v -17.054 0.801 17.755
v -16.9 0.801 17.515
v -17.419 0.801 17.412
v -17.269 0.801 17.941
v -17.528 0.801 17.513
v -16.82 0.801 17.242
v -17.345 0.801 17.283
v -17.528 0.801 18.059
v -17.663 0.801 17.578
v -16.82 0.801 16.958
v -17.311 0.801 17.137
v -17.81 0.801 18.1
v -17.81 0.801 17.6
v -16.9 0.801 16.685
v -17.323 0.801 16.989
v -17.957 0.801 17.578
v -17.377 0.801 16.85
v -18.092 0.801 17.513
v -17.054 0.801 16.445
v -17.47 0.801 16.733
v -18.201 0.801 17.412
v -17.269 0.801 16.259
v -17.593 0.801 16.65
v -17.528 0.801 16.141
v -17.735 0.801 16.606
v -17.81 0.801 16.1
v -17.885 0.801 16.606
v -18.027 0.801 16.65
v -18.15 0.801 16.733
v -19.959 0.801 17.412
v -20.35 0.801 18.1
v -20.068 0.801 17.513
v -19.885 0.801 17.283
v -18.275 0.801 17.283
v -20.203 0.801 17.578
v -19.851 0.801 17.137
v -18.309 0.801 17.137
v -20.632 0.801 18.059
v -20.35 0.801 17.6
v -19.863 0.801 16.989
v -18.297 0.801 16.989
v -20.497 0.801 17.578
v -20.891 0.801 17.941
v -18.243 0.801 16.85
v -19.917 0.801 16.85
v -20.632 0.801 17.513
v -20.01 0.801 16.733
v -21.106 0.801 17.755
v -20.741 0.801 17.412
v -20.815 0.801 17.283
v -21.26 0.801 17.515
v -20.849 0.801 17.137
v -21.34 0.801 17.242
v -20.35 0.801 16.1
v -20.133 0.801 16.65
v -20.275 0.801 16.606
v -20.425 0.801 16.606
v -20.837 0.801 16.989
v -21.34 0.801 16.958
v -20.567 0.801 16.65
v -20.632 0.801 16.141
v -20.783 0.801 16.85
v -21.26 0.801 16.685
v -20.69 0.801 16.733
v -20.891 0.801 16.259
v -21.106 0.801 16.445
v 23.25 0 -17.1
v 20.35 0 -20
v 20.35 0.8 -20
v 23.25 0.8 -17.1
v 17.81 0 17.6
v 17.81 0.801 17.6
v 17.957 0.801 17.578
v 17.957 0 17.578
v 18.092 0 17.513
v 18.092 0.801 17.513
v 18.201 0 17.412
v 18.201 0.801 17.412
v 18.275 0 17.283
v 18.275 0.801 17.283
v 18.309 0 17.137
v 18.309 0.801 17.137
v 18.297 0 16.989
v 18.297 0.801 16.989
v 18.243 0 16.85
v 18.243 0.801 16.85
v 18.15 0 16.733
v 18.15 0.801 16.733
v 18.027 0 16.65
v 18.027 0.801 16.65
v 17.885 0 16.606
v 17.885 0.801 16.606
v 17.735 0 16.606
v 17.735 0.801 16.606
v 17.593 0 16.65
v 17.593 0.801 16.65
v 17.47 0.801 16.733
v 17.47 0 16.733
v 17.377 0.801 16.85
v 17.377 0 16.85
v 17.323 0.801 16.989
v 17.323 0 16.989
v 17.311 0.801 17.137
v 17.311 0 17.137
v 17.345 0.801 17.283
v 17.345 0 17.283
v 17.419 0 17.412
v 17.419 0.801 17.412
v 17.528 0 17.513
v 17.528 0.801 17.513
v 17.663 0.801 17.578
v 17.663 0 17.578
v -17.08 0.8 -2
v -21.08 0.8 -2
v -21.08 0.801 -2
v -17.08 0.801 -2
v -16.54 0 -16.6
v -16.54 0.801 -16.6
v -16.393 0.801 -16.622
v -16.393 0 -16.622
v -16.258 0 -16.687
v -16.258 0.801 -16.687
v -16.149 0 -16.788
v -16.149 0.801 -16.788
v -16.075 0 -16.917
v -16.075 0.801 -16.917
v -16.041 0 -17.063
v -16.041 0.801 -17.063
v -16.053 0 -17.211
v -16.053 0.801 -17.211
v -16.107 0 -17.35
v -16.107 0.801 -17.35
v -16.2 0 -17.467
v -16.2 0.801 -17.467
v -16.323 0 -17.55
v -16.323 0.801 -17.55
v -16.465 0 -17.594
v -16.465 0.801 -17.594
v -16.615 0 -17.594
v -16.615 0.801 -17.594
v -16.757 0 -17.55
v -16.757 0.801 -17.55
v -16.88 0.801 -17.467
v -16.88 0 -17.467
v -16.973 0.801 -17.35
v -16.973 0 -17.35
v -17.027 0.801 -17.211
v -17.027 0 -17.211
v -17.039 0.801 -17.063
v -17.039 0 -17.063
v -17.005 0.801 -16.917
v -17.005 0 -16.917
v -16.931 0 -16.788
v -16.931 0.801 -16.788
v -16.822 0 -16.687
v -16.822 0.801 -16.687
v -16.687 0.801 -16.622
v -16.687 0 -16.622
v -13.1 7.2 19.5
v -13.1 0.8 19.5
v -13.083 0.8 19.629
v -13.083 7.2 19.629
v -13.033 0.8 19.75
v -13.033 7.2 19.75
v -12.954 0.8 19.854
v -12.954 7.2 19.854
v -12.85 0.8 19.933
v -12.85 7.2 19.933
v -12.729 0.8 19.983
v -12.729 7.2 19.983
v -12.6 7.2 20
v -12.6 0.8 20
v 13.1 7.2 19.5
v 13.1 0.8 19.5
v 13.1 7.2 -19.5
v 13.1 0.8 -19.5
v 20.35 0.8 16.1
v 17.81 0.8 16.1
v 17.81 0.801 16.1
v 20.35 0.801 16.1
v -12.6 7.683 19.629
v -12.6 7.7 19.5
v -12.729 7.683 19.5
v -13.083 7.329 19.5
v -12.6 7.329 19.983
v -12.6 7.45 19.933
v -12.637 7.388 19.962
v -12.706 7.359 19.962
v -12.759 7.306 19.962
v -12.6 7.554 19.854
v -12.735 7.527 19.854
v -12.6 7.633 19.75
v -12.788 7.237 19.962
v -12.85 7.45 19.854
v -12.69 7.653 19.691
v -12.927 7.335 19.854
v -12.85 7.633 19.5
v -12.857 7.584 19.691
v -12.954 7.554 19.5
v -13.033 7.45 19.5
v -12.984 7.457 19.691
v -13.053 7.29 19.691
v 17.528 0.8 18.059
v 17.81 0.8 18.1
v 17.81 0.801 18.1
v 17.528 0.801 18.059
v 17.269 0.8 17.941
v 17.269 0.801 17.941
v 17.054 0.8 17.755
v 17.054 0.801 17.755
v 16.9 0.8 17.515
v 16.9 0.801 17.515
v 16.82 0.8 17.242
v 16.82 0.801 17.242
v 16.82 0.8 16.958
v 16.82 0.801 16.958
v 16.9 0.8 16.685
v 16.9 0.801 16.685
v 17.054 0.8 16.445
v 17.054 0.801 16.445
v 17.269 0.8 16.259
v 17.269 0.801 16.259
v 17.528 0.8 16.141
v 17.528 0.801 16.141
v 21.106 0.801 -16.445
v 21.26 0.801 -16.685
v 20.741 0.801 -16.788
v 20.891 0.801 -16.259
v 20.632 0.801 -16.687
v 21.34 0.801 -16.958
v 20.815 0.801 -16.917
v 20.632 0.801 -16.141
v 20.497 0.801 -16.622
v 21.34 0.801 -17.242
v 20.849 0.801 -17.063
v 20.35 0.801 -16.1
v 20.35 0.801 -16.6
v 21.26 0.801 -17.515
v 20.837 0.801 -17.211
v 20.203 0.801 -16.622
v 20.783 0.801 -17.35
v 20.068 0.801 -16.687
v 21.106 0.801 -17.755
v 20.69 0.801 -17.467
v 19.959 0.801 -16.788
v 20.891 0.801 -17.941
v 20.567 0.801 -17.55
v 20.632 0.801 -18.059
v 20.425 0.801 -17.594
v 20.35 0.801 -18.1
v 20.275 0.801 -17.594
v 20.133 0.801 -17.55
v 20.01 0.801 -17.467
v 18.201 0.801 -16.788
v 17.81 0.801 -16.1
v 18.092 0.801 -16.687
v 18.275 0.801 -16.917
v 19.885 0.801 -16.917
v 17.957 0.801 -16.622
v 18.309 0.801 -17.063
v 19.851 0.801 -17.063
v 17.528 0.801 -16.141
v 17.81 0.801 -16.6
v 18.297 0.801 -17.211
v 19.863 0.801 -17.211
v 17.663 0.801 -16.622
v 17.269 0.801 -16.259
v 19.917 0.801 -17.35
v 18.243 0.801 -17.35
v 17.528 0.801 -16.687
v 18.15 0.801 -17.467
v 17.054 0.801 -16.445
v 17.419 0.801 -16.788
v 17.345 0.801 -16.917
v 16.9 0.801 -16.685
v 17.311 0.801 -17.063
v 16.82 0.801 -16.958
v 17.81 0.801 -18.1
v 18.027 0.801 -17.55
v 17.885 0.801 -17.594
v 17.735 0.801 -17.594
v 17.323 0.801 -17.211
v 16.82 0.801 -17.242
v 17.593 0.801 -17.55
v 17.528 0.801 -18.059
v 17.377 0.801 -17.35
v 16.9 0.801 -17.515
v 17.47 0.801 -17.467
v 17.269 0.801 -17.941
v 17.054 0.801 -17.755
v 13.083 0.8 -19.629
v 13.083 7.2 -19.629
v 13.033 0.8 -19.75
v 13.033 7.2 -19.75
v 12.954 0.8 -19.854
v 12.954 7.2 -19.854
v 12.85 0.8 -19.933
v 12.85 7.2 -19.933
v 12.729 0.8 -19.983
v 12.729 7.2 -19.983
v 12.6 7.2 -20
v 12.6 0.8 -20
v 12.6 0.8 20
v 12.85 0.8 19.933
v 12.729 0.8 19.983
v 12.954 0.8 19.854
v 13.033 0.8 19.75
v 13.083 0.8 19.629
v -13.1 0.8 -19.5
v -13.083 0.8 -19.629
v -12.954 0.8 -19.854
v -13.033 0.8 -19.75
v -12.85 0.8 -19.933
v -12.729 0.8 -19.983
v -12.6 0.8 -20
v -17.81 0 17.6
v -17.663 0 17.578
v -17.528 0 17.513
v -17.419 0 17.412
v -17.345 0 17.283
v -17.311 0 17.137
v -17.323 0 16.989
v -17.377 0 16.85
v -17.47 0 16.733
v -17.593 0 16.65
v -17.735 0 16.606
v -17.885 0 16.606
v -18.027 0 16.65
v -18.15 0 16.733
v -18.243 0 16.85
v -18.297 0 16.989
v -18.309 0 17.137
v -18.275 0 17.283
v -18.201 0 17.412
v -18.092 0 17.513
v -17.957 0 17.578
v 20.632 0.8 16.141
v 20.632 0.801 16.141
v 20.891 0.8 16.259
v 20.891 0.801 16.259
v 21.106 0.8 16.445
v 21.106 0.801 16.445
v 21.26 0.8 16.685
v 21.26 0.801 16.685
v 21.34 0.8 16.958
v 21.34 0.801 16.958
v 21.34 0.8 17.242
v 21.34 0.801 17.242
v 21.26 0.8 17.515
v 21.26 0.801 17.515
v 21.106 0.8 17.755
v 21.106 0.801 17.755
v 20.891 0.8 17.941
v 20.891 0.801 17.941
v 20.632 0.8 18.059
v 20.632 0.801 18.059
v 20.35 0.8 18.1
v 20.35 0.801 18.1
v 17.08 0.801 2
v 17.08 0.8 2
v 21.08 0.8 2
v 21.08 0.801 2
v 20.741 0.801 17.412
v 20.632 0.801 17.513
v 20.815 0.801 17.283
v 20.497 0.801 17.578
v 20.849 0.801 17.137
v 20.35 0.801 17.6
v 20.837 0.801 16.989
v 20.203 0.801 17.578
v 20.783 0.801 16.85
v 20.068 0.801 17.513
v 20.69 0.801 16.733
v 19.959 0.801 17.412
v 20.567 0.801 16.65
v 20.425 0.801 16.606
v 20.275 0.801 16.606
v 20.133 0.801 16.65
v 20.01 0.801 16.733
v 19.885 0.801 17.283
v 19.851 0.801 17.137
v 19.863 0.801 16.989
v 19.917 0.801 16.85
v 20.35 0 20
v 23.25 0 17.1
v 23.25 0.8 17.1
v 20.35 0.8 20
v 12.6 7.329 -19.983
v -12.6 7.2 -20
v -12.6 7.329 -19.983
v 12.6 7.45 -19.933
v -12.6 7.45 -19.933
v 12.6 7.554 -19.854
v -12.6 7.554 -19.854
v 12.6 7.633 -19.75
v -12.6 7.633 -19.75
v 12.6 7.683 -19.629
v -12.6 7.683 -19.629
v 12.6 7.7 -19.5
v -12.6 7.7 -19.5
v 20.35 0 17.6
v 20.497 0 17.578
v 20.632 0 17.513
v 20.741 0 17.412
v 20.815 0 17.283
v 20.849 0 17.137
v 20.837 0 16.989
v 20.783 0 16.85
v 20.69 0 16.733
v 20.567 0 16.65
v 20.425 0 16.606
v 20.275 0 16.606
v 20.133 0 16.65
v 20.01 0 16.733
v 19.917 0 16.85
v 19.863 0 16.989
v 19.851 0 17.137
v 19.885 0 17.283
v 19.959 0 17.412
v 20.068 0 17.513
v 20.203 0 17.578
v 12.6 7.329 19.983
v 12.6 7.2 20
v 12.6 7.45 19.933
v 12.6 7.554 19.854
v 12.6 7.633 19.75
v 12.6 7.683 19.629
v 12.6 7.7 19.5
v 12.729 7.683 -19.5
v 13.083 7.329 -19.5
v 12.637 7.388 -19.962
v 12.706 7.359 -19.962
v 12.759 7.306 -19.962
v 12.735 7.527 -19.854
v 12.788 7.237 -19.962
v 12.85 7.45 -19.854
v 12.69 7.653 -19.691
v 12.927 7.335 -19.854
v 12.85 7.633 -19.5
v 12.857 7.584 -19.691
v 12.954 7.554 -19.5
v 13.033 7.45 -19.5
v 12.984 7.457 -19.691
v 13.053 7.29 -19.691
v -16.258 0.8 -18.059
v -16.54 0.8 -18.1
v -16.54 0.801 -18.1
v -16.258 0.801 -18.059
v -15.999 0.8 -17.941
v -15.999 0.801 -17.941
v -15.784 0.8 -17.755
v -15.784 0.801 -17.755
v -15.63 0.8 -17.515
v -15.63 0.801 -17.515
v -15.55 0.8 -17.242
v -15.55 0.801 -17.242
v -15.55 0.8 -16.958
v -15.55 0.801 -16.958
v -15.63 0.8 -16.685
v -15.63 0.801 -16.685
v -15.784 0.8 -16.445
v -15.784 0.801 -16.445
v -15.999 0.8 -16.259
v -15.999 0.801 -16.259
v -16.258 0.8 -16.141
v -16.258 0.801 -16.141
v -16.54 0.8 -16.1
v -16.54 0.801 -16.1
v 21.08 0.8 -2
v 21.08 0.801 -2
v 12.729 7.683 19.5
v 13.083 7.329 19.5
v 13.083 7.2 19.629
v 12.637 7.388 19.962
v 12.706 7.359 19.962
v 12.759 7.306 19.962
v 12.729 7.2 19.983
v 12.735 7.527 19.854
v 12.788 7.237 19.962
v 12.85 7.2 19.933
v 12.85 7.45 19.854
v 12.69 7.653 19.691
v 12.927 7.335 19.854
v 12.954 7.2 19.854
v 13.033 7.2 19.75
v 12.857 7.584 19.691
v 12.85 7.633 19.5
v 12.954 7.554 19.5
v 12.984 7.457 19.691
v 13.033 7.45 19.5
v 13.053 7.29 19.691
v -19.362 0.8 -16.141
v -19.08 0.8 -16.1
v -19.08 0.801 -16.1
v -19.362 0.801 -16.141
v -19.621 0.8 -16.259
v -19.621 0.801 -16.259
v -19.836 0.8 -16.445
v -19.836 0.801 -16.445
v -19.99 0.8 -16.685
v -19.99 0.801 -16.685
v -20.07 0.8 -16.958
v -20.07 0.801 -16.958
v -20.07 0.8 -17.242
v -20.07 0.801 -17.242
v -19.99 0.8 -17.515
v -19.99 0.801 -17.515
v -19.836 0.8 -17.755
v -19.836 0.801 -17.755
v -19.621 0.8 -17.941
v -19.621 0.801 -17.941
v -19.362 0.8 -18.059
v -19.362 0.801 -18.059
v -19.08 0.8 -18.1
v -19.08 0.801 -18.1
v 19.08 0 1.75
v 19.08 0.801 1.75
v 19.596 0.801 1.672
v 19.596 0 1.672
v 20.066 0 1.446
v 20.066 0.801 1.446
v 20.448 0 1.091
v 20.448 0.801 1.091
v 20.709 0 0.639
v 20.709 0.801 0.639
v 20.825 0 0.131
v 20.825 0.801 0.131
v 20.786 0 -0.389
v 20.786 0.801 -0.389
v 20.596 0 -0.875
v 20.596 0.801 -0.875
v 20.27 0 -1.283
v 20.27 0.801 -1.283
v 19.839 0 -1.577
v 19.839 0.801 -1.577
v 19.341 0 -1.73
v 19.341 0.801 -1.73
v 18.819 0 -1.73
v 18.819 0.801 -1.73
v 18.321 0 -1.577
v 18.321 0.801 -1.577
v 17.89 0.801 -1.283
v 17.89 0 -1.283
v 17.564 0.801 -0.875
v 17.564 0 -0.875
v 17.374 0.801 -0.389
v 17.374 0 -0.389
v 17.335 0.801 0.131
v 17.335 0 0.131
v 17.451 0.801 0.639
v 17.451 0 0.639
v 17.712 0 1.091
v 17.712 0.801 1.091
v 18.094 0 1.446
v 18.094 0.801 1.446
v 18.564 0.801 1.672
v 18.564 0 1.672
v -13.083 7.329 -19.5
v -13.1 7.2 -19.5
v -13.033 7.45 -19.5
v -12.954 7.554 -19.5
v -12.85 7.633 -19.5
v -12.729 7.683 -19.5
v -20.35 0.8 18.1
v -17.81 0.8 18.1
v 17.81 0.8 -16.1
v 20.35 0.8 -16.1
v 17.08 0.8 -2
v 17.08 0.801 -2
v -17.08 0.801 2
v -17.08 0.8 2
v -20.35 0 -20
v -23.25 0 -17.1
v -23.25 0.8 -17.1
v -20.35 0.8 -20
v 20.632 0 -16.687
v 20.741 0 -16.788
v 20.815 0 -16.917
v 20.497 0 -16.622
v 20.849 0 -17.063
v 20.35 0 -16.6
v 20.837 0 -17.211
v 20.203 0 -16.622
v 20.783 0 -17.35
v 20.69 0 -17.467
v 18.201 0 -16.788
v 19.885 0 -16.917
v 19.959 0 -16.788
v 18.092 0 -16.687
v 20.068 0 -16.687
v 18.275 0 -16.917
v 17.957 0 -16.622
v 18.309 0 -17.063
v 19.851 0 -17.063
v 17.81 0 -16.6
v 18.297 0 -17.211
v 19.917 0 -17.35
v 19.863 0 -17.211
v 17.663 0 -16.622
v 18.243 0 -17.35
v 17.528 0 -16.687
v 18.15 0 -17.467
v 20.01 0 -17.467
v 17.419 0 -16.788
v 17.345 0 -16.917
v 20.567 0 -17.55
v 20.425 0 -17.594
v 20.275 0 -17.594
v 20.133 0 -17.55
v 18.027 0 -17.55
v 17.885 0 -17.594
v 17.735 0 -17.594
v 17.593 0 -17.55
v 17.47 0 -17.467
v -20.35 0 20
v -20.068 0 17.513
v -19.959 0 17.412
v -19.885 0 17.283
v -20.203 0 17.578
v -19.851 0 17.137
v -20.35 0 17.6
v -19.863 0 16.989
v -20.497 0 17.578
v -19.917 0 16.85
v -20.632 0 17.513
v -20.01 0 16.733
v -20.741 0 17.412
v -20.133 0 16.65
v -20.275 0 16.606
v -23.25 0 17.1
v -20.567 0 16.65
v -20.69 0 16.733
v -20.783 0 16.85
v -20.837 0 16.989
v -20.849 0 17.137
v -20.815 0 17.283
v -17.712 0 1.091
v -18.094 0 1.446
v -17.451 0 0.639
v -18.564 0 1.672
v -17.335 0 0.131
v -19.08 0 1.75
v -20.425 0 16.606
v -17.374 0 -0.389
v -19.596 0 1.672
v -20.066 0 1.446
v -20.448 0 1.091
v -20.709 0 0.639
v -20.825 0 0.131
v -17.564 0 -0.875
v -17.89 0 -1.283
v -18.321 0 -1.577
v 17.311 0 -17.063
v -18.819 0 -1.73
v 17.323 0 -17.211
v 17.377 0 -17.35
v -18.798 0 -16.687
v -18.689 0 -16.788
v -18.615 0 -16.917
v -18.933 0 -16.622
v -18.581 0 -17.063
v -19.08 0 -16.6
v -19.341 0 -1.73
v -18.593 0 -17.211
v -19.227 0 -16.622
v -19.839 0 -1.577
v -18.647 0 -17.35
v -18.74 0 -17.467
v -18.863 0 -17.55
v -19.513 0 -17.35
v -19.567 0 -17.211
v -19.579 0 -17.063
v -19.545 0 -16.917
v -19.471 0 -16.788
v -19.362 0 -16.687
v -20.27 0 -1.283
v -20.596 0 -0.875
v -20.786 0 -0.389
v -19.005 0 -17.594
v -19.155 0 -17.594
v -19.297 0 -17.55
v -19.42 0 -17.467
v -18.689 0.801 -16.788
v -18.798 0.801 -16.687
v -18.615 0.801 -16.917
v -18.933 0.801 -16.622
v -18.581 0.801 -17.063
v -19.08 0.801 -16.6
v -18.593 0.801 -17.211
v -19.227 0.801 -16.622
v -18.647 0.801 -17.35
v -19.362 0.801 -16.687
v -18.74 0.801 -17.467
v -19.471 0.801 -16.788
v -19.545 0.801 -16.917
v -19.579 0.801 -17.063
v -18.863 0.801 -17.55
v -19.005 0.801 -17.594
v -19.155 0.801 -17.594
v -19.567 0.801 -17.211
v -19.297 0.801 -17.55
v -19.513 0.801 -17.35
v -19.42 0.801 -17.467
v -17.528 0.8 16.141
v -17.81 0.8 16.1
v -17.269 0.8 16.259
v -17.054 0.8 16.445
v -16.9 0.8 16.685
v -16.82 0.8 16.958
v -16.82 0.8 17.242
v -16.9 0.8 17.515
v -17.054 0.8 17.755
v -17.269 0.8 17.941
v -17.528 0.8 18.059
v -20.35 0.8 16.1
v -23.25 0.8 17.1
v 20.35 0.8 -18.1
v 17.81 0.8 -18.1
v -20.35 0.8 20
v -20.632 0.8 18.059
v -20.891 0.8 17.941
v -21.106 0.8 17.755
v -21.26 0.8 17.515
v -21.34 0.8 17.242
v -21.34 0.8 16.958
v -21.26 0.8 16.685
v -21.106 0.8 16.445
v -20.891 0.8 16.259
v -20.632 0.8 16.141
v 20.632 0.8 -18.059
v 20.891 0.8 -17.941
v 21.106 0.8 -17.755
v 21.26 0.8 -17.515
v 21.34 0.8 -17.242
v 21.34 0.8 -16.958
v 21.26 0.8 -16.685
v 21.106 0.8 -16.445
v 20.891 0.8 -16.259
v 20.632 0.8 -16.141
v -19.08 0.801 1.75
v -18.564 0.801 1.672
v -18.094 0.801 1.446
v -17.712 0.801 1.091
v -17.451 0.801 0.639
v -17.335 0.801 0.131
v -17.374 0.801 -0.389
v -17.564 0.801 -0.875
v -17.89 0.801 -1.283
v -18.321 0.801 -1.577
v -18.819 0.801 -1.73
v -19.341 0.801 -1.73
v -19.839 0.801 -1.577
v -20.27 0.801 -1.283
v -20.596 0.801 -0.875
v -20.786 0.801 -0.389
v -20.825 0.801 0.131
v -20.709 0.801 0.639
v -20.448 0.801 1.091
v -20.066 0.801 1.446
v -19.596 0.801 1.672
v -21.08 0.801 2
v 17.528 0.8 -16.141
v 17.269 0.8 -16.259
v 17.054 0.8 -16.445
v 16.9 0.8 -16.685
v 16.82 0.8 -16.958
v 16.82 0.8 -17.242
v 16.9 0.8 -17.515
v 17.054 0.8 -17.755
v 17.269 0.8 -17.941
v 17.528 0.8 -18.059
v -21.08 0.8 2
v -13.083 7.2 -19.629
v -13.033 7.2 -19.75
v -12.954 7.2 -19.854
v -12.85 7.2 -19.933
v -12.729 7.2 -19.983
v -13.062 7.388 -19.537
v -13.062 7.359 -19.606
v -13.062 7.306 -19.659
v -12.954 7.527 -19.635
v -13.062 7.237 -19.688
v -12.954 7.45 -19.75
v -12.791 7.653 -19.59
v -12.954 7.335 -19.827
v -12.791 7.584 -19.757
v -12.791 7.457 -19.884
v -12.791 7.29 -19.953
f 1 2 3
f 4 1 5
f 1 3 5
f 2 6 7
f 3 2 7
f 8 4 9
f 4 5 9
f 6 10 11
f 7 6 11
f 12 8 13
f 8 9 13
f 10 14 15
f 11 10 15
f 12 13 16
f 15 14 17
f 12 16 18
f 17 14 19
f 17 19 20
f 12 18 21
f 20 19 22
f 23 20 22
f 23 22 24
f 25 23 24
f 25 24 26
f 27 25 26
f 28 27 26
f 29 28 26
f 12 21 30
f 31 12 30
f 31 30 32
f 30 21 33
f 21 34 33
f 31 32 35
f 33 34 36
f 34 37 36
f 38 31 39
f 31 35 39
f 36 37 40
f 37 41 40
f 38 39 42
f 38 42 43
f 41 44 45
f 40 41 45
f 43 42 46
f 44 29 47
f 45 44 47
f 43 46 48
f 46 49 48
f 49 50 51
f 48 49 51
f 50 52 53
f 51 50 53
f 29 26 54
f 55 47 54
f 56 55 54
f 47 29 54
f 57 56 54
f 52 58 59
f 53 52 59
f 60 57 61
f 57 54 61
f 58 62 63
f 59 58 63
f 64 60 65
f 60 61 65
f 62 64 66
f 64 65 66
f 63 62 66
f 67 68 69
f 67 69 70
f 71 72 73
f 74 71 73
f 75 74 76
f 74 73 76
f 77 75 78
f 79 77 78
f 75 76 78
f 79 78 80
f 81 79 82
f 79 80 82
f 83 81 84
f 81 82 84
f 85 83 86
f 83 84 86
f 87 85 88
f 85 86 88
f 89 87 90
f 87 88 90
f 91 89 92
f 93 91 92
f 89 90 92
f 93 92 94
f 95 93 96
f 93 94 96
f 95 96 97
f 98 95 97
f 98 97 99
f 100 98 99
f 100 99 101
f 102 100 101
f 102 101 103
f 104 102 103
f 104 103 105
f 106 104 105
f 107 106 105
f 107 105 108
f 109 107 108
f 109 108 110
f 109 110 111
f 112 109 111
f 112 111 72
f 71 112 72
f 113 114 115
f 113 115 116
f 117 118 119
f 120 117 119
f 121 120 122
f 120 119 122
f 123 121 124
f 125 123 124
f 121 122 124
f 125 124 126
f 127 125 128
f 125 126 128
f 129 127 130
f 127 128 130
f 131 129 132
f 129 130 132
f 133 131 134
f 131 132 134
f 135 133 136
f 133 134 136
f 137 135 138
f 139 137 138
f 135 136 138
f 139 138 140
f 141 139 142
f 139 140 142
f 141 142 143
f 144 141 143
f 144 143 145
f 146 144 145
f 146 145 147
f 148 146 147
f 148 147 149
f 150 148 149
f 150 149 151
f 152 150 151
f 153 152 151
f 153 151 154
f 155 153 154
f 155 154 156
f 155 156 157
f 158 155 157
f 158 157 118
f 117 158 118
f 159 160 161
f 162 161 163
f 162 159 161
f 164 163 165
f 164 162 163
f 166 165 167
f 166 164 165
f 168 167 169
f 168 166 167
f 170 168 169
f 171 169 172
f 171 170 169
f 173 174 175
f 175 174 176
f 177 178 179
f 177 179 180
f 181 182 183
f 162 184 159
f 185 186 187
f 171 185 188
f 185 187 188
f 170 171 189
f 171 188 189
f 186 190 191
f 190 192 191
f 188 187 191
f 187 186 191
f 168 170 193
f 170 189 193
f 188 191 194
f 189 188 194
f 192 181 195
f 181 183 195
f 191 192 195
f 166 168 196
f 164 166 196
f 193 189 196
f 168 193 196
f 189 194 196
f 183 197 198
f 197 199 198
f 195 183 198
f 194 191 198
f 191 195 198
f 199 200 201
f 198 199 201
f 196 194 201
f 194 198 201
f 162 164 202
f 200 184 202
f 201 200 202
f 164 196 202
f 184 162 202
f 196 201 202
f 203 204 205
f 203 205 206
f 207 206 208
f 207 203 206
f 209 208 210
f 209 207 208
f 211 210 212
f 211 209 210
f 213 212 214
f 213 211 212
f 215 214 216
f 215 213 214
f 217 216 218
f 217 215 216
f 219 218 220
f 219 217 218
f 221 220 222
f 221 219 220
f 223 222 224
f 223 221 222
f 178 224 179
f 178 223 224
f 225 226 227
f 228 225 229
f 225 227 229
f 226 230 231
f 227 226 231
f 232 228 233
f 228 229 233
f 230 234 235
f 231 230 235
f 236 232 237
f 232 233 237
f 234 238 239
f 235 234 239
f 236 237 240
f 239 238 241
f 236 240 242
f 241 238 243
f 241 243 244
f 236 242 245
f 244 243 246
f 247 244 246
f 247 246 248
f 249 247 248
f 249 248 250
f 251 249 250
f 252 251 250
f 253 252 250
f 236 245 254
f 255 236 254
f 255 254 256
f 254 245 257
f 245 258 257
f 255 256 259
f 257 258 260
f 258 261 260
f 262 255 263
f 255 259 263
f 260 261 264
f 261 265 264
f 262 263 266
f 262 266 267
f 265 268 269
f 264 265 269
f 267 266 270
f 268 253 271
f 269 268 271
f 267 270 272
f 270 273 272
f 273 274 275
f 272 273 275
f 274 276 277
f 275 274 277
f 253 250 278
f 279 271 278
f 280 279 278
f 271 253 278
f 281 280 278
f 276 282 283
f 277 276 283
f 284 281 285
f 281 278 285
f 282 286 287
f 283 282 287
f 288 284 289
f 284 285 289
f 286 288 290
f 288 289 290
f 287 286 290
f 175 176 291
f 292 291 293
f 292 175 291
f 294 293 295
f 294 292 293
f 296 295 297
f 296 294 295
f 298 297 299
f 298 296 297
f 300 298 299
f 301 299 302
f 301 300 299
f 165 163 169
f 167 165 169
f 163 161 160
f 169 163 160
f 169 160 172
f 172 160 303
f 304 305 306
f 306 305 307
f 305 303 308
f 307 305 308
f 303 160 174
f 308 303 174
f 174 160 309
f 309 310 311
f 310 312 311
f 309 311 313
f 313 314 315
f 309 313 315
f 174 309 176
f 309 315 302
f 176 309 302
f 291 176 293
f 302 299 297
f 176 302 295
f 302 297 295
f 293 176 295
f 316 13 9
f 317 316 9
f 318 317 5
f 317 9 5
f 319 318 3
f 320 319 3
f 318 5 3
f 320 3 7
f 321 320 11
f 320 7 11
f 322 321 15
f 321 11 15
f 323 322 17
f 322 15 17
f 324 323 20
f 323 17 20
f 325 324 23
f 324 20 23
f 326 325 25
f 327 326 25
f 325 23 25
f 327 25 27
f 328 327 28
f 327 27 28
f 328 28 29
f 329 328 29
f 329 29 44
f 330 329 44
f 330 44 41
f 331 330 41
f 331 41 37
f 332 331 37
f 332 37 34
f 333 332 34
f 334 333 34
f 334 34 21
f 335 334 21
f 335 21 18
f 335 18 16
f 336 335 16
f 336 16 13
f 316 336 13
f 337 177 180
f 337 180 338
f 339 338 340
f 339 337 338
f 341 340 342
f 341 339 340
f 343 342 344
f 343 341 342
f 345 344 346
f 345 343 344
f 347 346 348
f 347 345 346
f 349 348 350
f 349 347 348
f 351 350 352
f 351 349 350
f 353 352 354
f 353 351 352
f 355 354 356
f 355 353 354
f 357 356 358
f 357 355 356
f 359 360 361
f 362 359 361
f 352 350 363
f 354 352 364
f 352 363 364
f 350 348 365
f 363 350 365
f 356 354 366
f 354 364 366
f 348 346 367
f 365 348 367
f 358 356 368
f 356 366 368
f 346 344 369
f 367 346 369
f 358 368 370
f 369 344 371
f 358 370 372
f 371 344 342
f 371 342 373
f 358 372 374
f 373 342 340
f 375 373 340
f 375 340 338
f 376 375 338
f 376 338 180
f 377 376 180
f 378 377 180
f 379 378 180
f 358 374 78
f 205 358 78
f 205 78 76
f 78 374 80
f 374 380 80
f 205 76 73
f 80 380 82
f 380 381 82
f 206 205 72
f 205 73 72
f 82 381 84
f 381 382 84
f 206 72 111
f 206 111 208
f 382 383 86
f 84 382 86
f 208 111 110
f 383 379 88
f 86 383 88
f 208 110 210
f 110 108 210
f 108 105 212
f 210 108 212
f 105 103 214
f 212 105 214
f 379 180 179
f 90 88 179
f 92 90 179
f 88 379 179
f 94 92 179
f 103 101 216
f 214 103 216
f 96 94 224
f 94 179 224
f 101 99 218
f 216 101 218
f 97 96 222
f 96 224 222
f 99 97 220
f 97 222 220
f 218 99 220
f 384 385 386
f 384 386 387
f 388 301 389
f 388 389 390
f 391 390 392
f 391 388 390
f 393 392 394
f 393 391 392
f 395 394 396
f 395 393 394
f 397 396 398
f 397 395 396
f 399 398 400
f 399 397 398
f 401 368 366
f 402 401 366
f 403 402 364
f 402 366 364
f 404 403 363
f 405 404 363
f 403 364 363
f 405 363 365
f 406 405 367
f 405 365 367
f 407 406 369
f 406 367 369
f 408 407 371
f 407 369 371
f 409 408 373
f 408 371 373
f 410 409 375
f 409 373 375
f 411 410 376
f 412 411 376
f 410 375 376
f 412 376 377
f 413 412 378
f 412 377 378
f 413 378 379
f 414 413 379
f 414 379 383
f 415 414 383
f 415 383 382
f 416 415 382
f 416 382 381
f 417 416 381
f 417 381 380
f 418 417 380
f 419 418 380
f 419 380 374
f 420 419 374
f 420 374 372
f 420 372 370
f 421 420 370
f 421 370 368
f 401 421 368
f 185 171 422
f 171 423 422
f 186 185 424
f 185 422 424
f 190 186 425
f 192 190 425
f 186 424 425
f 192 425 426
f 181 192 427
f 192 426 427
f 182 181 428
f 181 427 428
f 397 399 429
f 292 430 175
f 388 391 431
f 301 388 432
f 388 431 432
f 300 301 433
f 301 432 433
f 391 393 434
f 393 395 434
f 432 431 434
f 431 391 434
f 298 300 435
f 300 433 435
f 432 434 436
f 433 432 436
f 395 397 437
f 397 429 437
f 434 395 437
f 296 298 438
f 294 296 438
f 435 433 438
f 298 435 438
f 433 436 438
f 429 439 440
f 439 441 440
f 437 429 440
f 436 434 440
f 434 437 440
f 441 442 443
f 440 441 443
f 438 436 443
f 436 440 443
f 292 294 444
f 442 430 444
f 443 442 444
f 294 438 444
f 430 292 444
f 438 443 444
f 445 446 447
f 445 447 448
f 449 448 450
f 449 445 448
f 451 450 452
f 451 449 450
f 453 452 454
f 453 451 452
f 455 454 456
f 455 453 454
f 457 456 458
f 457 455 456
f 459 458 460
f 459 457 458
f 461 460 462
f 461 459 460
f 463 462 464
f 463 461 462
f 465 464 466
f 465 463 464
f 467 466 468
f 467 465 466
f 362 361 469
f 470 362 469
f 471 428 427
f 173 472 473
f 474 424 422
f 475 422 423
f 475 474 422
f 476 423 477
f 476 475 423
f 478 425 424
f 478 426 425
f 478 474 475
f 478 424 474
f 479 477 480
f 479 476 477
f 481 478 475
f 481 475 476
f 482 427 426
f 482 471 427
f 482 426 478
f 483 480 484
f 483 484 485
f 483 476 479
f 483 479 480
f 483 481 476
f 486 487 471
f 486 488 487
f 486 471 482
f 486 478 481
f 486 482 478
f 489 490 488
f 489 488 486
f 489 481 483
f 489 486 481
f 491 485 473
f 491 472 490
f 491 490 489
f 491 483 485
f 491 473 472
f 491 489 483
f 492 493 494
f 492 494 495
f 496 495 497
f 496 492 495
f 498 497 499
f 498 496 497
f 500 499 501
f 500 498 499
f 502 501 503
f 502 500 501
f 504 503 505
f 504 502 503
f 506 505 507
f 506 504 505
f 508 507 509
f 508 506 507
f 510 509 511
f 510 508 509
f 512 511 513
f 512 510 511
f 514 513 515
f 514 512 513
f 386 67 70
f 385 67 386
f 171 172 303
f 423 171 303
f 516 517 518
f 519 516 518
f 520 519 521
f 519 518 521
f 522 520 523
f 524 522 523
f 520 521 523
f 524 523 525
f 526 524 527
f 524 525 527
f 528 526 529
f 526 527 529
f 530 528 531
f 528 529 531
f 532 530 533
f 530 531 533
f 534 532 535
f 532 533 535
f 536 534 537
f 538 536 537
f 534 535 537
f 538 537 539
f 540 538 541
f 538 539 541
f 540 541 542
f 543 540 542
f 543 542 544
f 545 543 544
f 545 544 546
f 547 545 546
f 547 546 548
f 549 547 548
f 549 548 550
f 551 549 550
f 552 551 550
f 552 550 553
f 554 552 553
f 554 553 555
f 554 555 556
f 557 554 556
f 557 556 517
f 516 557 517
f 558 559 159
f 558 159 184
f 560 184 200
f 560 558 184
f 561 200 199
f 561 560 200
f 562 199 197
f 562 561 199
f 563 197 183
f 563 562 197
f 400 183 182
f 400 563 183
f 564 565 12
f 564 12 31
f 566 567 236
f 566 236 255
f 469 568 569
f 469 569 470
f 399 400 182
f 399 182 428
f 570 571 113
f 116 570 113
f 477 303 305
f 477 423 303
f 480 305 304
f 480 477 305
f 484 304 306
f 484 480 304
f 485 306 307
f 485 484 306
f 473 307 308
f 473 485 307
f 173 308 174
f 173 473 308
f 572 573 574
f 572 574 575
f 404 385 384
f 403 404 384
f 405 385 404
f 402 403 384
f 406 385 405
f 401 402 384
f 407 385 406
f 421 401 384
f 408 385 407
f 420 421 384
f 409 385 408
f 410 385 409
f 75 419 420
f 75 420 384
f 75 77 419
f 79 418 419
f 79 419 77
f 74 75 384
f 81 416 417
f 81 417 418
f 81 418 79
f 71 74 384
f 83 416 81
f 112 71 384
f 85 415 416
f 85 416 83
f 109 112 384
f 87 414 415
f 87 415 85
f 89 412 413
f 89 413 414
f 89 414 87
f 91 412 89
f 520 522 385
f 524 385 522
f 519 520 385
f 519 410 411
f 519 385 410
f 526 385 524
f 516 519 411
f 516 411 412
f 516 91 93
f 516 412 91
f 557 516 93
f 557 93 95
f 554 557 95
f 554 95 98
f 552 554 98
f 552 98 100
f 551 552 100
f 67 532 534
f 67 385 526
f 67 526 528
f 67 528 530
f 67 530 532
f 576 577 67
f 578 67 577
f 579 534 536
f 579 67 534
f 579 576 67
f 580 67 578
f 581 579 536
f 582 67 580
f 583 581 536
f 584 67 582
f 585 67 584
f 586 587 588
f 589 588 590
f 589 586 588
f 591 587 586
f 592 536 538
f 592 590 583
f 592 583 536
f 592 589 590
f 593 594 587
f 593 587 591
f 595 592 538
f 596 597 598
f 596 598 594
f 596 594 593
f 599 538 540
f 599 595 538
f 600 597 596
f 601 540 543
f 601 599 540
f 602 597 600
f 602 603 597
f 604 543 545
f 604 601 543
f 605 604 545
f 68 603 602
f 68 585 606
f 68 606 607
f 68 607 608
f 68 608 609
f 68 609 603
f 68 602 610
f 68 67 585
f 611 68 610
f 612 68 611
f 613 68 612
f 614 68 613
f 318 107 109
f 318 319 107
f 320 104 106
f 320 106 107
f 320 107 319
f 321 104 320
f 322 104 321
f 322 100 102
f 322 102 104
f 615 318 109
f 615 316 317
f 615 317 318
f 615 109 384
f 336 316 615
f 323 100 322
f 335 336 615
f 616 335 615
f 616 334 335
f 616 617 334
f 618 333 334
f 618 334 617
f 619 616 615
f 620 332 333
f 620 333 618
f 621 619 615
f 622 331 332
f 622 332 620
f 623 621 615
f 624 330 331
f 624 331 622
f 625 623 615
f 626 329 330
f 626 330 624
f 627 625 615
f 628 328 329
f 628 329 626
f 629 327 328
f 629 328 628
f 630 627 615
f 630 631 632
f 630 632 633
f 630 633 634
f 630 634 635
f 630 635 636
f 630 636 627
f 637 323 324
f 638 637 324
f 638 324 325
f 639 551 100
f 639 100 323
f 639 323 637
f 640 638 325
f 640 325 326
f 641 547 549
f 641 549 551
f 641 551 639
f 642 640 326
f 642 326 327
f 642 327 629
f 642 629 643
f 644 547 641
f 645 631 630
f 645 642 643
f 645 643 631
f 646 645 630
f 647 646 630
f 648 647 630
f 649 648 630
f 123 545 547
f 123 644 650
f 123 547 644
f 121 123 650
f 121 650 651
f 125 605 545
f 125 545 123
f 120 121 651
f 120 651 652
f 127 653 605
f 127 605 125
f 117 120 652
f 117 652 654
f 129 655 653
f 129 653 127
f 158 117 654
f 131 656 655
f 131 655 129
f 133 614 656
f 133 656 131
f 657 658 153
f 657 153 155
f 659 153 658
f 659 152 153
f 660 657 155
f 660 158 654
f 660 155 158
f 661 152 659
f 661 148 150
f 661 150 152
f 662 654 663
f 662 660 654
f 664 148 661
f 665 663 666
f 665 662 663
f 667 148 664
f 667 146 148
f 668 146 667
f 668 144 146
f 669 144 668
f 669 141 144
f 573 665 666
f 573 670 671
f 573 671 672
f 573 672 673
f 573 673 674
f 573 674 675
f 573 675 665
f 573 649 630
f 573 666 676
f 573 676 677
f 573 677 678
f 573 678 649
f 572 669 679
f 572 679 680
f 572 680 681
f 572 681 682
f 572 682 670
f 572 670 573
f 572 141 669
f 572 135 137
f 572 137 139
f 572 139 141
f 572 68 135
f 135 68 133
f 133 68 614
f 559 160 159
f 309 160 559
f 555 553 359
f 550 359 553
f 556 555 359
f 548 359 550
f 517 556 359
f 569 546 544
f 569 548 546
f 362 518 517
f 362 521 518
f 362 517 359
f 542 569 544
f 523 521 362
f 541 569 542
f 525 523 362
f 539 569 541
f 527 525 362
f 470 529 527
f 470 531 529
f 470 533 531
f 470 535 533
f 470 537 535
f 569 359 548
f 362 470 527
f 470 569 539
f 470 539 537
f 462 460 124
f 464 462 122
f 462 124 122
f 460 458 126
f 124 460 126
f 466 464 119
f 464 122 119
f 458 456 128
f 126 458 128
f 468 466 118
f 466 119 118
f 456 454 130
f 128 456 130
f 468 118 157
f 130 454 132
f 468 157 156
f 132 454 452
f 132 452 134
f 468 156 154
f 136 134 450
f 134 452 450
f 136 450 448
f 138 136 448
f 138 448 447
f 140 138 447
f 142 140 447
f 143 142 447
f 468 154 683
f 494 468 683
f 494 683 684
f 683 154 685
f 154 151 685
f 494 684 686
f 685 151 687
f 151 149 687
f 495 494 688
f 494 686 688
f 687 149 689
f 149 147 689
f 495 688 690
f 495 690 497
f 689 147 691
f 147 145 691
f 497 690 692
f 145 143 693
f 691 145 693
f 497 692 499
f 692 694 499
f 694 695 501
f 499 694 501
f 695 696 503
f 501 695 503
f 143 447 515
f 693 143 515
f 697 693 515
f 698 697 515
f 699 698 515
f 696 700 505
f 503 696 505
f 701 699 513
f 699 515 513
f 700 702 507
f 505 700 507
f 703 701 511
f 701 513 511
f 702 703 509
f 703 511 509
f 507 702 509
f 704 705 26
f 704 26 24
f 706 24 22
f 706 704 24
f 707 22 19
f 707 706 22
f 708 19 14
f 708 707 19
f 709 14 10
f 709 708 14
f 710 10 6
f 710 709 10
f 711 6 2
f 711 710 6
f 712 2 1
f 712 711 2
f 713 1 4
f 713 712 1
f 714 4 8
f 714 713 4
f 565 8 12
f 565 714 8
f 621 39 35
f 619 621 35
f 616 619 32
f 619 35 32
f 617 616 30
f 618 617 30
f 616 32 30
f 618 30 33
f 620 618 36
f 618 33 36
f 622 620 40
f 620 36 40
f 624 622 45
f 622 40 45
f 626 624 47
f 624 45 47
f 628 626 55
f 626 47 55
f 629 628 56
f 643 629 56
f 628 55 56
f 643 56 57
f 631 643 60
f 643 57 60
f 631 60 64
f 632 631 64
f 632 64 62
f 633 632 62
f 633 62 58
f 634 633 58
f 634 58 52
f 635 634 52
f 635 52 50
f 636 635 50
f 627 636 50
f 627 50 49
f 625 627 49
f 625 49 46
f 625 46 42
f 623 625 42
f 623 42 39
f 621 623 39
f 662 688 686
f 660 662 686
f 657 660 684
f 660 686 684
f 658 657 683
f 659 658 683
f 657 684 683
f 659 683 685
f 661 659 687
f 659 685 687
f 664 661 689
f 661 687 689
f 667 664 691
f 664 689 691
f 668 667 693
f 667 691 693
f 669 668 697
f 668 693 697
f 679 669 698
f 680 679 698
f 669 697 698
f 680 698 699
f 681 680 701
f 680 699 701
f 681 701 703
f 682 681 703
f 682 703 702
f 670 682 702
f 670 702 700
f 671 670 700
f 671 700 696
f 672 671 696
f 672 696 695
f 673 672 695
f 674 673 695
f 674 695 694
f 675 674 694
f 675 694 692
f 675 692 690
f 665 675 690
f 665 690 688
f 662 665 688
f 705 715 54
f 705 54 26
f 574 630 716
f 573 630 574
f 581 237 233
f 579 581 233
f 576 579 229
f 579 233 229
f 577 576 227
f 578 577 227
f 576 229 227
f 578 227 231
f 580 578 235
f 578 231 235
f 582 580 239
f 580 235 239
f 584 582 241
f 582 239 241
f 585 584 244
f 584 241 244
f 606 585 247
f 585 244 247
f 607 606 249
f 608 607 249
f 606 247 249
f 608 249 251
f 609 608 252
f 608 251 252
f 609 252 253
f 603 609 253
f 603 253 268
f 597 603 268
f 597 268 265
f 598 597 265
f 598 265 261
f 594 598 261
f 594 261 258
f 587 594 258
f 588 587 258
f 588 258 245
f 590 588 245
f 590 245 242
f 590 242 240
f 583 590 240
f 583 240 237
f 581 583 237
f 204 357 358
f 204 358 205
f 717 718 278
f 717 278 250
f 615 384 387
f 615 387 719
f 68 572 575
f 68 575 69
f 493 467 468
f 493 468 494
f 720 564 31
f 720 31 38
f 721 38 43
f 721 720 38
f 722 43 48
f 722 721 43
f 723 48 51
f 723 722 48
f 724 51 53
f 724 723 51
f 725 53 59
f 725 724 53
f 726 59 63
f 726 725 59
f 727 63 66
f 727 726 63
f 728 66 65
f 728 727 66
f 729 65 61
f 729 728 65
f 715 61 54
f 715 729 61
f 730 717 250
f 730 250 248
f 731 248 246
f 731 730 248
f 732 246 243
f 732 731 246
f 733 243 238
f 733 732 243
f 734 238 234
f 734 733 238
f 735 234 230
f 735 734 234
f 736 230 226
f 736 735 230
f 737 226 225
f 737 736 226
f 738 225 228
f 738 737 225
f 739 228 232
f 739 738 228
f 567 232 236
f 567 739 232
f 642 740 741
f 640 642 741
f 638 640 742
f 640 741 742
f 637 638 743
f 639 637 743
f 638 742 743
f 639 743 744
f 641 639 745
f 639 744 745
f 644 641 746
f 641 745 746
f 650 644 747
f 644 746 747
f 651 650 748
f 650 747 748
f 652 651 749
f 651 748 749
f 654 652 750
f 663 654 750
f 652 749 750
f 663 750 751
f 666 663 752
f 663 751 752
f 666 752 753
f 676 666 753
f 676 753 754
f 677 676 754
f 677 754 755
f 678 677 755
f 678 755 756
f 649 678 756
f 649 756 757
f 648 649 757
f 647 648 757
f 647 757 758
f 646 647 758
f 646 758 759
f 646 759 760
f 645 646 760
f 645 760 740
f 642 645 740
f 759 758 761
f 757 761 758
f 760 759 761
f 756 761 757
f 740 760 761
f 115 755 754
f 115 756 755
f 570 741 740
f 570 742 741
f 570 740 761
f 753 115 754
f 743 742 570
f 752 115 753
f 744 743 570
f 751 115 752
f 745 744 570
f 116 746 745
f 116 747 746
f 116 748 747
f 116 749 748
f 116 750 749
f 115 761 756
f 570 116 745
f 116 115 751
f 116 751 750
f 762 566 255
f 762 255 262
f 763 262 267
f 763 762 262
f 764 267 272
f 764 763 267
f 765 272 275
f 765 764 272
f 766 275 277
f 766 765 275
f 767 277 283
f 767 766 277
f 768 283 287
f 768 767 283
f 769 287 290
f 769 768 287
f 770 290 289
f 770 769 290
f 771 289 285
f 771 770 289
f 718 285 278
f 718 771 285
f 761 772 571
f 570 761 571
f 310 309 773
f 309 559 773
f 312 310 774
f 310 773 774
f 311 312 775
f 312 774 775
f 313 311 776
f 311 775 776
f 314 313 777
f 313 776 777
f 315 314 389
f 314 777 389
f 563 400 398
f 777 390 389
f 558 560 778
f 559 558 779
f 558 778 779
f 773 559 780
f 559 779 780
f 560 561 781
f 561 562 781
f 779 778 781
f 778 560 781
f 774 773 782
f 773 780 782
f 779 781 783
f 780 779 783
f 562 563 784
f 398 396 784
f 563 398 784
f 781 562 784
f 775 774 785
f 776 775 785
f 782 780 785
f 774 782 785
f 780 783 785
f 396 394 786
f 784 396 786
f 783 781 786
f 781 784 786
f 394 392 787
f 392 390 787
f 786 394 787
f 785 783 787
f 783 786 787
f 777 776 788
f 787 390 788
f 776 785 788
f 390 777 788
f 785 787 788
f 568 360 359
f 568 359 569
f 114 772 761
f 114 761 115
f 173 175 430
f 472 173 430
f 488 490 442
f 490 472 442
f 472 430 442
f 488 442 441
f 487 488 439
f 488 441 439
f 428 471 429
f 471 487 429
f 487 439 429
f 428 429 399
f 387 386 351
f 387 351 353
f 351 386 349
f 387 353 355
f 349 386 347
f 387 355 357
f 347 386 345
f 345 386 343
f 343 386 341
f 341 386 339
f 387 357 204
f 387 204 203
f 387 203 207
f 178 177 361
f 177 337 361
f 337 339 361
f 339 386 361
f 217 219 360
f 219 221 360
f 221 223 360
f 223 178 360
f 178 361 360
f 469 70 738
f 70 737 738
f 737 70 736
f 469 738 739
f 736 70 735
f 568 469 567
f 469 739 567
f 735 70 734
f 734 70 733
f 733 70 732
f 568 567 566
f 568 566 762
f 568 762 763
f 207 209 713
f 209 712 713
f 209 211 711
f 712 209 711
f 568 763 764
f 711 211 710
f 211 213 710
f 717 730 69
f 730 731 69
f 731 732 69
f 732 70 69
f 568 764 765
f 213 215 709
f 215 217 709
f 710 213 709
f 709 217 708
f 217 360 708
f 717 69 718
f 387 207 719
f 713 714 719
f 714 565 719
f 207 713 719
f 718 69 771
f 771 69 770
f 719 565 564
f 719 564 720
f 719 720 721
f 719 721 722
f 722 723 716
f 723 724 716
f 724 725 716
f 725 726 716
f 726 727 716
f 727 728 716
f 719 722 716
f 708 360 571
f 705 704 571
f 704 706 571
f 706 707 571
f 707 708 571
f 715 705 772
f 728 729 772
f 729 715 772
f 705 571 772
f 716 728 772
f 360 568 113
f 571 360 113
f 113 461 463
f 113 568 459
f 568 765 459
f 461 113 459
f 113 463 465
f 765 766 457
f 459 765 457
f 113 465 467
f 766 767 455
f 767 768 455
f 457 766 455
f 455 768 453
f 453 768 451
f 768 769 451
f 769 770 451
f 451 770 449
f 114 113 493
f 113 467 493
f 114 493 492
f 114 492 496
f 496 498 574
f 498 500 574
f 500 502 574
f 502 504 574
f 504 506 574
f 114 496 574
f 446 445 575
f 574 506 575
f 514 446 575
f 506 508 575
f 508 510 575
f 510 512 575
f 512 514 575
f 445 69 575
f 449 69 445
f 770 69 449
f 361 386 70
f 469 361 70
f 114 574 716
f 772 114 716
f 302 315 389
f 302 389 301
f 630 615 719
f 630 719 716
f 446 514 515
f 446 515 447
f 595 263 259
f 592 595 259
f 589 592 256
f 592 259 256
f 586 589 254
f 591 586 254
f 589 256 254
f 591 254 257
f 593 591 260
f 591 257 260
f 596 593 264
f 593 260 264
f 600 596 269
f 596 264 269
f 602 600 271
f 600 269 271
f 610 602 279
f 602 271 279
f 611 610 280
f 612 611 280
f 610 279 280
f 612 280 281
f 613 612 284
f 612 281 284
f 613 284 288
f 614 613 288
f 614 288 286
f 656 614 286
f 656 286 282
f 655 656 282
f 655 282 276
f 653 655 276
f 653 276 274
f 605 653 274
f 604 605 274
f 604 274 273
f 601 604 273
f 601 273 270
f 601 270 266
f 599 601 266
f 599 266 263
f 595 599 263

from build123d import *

# Parameters (mm, degrees)
BOSS_EXTRUDE1_DEPTH = 0.8
SKETCH2_W           = 26.2
SKETCH2_H           = 40
BOSS_EXTRUDE2_DEPTH = 6.9
FILLET1_R           = 0.5
BOSS_EXTRUDE3_DEPTH = 0.001
SKETCH4_R           = 0.5
CUT_EXTRUDE1_DEPTH  = 80.001
SKETCH5_W           = 4
SKETCH5_H           = 4
BOSS_EXTRUDE4_DEPTH = 0.001
SKETCH6_R           = 1.75
CUT_EXTRUDE2_DEPTH  = 70.001


with BuildPart() as part:
    # Sketch1 → Boss-Extrude1 (new body)
    with BuildSketch(Plane(origin=(0, 0, 0), x_dir=(1, 0, 0), z_dir=(0, 1, 0))):
        Polygon((-23.25, 17.1), (-20.35, 20), (20.35, 20), (23.25, 17.1), (23.25, -17.1), (20.35, -20), (-20.35, -20), (-23.25, -17.1), align=None)
    extrude(amount=BOSS_EXTRUDE1_DEPTH)

    # Sketch3 → Boss-Extrude3 (add)
    with BuildSketch(Plane(origin=(0, 0.8, 0), x_dir=(1, 0, 0), z_dir=(0, 1, 0))):
        with BuildLine():
            Line((17.81, 18.1), (20.35, 18.1))
            ThreePointArc((20.35, 18.1), (21.35, 17.1), (20.35, 16.1))
            Line((20.35, 16.1), (17.81, 16.1))
            ThreePointArc((17.81, 16.1), (16.81, 17.1), (17.81, 18.1))
        make_face()
        with BuildLine():
            Line((17.81, -16.1), (20.35, -16.1))
            ThreePointArc((20.35, -16.1), (21.35, -17.1), (20.35, -18.1))
            Line((20.35, -18.1), (17.81, -18.1))
            ThreePointArc((17.81, -18.1), (16.81, -17.1), (17.81, -16.1))
        make_face()
        with BuildLine():
            Line((-19.08, 18.1), (-16.54, 18.1))
            ThreePointArc((-16.54, 18.1), (-15.54, 17.1), (-16.54, 16.1))
            Line((-16.54, 16.1), (-19.08, 16.1))
            ThreePointArc((-19.08, 16.1), (-20.08, 17.1), (-19.08, 18.1))
        make_face()
        with BuildLine():
            Line((-20.35, -16.1), (-17.81, -16.1))
            ThreePointArc((-17.81, -16.1), (-16.81, -17.1), (-17.81, -18.1))
            Line((-17.81, -18.1), (-20.35, -18.1))
            ThreePointArc((-20.35, -18.1), (-21.35, -17.1), (-20.35, -16.1))
        make_face()
    extrude(amount=BOSS_EXTRUDE3_DEPTH)

    # Sketch4 → Cut-Extrude1 (cut)
    with BuildSketch(Plane(origin=(0, 0.801, 0), x_dir=(1, 0, 0), z_dir=(0, 1, 0))):
        with Locations(Location((-16.54, 17.1, 0), (0, 0, 270))):
            Circle(SKETCH4_R)
        with Locations(Location((-19.08, 17.1, 0), (0, 0, 270))):
            Circle(SKETCH4_R)
        with Locations(Location((20.35, 17.1, 0), (0, 0, 270))):
            Circle(SKETCH4_R)
        with Locations(Location((17.81, 17.1, 0), (0, 0, 270))):
            Circle(SKETCH4_R)
        with Locations(Location((20.35, -17.1, 0), (0, 0, 270))):
            Circle(SKETCH4_R)
        with Locations(Location((17.81, -17.1, 0), (0, 0, 270))):
            Circle(SKETCH4_R)
        with Locations(Location((-17.81, -17.1, 0), (0, 0, 270))):
            Circle(SKETCH4_R)
        with Locations(Location((-20.35, -17.1, 0), (0, 0, 270))):
            Circle(SKETCH4_R)
    extrude(amount=-CUT_EXTRUDE1_DEPTH, mode=Mode.SUBTRACT)

    # Sketch5 → Boss-Extrude4 (add)
    with BuildSketch(Plane(origin=(0, 0.8, 0), x_dir=(1, 0, 0), z_dir=(0, 1, 0))):
        with Locations((-19.08, 0)):
            Rectangle(SKETCH5_W, SKETCH5_H)
        with Locations((19.08, 0)):
            Rectangle(SKETCH5_W, SKETCH5_H)
    extrude(amount=BOSS_EXTRUDE4_DEPTH)

    # Sketch6 → Cut-Extrude2 (cut)
    with BuildSketch(Plane(origin=(0, 0.801, 0), x_dir=(1, 0, 0), z_dir=(0, 1, 0))):
        with Locations(Location((-19.08, 0, 0), (0, 0, 270))):
            Circle(SKETCH6_R)
        with Locations(Location((19.08, 0, 0), (0, 0, 270))):
            Circle(SKETCH6_R)
    extrude(amount=-CUT_EXTRUDE2_DEPTH, mode=Mode.SUBTRACT)


with BuildPart() as body_2:
    # Sketch2 → Boss-Extrude2 (new body)
    with BuildSketch(Plane(origin=(0, 0.8, 0), x_dir=(1, 0, 0), z_dir=(0, 1, 0))):
        Rectangle(SKETCH2_W, SKETCH2_H)
    extrude(amount=BOSS_EXTRUDE2_DEPTH)

    # Fillet1
    fillet1_edges = [body_2.edges().sort_by_distance(p)[0] for p in [
        (13.1, 7.7, 0),
        (0, 7.7, -20),
        (-13.1, 7.7, 0),
        (0, 7.7, 20),
        (-13.1, 4.25, -20),
        (13.1, 4.25, -20),
        (13.1, 4.25, 20),
        (-13.1, 4.25, 20),
    ]]
    fillet(fillet1_edges, radius=FILLET1_R)


solid = Compound([part.part, body_2.part])
